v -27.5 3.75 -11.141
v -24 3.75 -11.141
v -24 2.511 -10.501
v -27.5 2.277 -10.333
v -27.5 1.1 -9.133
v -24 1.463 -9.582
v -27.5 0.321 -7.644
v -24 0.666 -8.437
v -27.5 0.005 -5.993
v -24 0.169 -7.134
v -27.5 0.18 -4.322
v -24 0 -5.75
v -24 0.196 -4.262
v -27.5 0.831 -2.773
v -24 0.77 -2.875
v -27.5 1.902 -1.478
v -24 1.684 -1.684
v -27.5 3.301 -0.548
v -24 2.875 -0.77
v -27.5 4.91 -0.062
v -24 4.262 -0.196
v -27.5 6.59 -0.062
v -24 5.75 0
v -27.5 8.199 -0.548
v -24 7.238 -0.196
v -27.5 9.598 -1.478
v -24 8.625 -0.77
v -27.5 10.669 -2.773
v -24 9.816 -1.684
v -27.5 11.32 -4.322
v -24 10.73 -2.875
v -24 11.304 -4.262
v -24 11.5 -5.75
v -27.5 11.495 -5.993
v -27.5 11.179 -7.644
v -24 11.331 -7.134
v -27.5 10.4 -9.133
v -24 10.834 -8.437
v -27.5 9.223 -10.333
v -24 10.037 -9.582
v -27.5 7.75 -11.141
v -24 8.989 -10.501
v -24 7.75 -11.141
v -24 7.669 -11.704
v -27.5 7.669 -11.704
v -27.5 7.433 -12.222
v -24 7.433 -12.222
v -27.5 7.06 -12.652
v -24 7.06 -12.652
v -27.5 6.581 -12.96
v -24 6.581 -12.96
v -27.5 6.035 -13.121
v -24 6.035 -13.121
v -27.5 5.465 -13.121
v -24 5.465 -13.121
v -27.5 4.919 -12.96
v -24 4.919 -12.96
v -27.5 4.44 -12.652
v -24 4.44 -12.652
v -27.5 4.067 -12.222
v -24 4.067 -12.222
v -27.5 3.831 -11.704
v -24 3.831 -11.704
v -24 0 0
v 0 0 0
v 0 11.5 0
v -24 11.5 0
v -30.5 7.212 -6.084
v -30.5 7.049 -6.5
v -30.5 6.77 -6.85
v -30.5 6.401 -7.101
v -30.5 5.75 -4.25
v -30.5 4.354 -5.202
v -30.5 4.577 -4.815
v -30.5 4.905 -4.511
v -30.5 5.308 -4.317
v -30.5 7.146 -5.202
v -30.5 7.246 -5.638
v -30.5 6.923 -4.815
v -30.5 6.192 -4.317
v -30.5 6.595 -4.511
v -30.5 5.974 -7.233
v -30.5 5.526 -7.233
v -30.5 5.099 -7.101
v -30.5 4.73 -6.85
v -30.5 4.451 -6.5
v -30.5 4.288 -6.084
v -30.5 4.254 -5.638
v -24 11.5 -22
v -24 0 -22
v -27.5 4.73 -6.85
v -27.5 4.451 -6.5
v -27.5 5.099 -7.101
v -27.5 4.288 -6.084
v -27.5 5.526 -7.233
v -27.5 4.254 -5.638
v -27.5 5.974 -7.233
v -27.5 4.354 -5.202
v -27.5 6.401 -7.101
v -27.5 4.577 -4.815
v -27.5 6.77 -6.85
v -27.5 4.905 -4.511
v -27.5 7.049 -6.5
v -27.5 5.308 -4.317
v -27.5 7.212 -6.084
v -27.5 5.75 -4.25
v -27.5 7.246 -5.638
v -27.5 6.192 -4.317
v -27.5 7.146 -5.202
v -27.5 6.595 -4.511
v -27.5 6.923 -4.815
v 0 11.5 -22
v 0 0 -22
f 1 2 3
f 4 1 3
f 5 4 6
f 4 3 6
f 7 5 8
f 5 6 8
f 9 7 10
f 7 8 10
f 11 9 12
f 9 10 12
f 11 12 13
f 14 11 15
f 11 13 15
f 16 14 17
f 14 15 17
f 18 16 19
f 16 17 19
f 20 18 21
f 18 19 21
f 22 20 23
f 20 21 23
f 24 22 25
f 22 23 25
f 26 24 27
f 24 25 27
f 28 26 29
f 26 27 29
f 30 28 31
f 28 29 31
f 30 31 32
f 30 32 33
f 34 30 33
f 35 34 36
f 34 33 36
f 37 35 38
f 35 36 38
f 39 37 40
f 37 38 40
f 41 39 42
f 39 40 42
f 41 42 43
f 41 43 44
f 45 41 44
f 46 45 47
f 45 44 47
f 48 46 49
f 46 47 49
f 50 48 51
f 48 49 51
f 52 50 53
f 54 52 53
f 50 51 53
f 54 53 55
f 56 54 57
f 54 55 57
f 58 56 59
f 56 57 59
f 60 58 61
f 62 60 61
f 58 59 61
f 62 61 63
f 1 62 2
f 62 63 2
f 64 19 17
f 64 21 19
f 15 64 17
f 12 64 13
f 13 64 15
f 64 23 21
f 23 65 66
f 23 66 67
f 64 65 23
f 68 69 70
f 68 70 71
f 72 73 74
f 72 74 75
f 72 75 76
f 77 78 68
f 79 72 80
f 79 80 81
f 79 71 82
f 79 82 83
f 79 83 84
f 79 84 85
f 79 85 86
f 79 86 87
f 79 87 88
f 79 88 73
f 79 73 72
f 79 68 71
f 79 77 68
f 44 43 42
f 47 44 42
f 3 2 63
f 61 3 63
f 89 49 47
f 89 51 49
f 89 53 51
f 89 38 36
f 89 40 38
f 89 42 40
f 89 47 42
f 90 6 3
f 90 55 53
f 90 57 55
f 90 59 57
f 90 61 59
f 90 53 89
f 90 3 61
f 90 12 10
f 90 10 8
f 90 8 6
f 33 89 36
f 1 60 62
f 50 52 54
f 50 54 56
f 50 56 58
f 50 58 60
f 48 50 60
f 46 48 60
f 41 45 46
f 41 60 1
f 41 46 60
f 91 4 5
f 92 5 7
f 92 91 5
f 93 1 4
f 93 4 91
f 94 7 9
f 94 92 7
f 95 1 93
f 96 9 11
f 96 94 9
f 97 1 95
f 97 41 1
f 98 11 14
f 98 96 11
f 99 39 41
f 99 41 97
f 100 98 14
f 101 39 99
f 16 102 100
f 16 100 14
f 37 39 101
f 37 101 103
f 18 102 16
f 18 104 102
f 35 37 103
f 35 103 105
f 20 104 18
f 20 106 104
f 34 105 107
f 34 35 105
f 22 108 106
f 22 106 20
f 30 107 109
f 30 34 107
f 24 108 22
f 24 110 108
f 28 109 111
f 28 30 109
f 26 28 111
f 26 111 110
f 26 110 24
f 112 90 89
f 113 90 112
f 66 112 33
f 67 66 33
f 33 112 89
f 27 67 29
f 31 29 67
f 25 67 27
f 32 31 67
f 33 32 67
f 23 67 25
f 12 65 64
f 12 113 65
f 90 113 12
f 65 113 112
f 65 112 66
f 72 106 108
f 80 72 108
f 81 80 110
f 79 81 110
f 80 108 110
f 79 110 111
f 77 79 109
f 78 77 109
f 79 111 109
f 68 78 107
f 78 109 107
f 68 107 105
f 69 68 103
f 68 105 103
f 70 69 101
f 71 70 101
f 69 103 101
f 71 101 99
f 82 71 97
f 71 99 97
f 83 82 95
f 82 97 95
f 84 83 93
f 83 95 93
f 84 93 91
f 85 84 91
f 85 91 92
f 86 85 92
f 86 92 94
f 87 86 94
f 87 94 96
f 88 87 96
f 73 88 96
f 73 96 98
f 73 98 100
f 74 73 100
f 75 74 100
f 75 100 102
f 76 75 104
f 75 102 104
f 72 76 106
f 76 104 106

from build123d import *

# Parameters (mm, degrees)
BOSS_EXTRUDE1_DEPTH = 11.5
BOSS_EXTRUDE2_DEPTH = 3.5
SKETCH4_R           = 1.5
BOSS_EXTRUDE3_DEPTH = 3
SKETCH5_R           = 1.25
CUT_EXTRUDE1_DEPTH  = 3.5
SKETCH6_W           = 4
SKETCH6_H           = 11.5
CUT_EXTRUDE2_DEPTH  = 10
SKETCH7_W           = 4
SKETCH7_H           = 11.5
CUT_EXTRUDE3_DEPTH  = 10


with BuildPart() as part:
    # Sketch1 → Boss-Extrude1 (new body)
    with BuildSketch(Plane(origin=(0, 0, 0), x_dir=(1, 0, 0), z_dir=(0, 1, 0))):
        Polygon((-20, 0), (-24, 0), (-24, 22), (-20, 22), (-20, 26), (-18, 26), (-18, 22), (0, 22), (0, 0), (-18, 0), (-18, -4), (-20, -4), align=None)
    extrude(amount=BOSS_EXTRUDE1_DEPTH)

    # Sketch2 → Boss-Extrude2 (add)
    with BuildSketch(Plane.ZY.offset(24)):
        with BuildLine():
            ThreePointArc((-11.140964663, 3.75), (0, 5.75), (-11.140964663, 7.75))
            ThreePointArc((-11.140964663, 7.75), (-13.140964663, 5.75), (-11.140964663, 3.75))
        make_face()
    extrude(amount=BOSS_EXTRUDE2_DEPTH)

    # Sketch4 → Boss-Extrude3 (add)
    with BuildSketch(Plane.ZY.offset(27.5)):
        with Locations((-5.75, 5.75)):
            Circle(SKETCH4_R)
    extrude(amount=BOSS_EXTRUDE3_DEPTH)

    # Sketch5 → Cut-Extrude1 (cut)
    with BuildSketch(Plane.ZY.offset(20)):
        with Locations((-24.8, 5.75)):
            Circle(SKETCH5_R)
        with Locations((2.8, 5.75)):
            Circle(SKETCH5_R)
    extrude(amount=-CUT_EXTRUDE1_DEPTH, mode=Mode.SUBTRACT)

    # Sketch6 → Cut-Extrude2 (cut)
    with BuildSketch(Plane(origin=(-18, 0, 0), x_dir=(0, 0, -1), z_dir=(1, 0, 0))):
        with Locations((24, 5.75)):
            Rectangle(SKETCH6_W, SKETCH6_H)
    extrude(amount=-CUT_EXTRUDE2_DEPTH, mode=Mode.SUBTRACT)

    # Sketch7 → Cut-Extrude3 (cut)
    with BuildSketch(Plane(origin=(-18, 0, 0), x_dir=(0, 0, -1), z_dir=(1, 0, 0))):
        with Locations((-2, 5.75)):
            Rectangle(SKETCH7_W, SKETCH7_H)
    extrude(amount=-CUT_EXTRUDE3_DEPTH, mode=Mode.SUBTRACT)


solid = part.part
